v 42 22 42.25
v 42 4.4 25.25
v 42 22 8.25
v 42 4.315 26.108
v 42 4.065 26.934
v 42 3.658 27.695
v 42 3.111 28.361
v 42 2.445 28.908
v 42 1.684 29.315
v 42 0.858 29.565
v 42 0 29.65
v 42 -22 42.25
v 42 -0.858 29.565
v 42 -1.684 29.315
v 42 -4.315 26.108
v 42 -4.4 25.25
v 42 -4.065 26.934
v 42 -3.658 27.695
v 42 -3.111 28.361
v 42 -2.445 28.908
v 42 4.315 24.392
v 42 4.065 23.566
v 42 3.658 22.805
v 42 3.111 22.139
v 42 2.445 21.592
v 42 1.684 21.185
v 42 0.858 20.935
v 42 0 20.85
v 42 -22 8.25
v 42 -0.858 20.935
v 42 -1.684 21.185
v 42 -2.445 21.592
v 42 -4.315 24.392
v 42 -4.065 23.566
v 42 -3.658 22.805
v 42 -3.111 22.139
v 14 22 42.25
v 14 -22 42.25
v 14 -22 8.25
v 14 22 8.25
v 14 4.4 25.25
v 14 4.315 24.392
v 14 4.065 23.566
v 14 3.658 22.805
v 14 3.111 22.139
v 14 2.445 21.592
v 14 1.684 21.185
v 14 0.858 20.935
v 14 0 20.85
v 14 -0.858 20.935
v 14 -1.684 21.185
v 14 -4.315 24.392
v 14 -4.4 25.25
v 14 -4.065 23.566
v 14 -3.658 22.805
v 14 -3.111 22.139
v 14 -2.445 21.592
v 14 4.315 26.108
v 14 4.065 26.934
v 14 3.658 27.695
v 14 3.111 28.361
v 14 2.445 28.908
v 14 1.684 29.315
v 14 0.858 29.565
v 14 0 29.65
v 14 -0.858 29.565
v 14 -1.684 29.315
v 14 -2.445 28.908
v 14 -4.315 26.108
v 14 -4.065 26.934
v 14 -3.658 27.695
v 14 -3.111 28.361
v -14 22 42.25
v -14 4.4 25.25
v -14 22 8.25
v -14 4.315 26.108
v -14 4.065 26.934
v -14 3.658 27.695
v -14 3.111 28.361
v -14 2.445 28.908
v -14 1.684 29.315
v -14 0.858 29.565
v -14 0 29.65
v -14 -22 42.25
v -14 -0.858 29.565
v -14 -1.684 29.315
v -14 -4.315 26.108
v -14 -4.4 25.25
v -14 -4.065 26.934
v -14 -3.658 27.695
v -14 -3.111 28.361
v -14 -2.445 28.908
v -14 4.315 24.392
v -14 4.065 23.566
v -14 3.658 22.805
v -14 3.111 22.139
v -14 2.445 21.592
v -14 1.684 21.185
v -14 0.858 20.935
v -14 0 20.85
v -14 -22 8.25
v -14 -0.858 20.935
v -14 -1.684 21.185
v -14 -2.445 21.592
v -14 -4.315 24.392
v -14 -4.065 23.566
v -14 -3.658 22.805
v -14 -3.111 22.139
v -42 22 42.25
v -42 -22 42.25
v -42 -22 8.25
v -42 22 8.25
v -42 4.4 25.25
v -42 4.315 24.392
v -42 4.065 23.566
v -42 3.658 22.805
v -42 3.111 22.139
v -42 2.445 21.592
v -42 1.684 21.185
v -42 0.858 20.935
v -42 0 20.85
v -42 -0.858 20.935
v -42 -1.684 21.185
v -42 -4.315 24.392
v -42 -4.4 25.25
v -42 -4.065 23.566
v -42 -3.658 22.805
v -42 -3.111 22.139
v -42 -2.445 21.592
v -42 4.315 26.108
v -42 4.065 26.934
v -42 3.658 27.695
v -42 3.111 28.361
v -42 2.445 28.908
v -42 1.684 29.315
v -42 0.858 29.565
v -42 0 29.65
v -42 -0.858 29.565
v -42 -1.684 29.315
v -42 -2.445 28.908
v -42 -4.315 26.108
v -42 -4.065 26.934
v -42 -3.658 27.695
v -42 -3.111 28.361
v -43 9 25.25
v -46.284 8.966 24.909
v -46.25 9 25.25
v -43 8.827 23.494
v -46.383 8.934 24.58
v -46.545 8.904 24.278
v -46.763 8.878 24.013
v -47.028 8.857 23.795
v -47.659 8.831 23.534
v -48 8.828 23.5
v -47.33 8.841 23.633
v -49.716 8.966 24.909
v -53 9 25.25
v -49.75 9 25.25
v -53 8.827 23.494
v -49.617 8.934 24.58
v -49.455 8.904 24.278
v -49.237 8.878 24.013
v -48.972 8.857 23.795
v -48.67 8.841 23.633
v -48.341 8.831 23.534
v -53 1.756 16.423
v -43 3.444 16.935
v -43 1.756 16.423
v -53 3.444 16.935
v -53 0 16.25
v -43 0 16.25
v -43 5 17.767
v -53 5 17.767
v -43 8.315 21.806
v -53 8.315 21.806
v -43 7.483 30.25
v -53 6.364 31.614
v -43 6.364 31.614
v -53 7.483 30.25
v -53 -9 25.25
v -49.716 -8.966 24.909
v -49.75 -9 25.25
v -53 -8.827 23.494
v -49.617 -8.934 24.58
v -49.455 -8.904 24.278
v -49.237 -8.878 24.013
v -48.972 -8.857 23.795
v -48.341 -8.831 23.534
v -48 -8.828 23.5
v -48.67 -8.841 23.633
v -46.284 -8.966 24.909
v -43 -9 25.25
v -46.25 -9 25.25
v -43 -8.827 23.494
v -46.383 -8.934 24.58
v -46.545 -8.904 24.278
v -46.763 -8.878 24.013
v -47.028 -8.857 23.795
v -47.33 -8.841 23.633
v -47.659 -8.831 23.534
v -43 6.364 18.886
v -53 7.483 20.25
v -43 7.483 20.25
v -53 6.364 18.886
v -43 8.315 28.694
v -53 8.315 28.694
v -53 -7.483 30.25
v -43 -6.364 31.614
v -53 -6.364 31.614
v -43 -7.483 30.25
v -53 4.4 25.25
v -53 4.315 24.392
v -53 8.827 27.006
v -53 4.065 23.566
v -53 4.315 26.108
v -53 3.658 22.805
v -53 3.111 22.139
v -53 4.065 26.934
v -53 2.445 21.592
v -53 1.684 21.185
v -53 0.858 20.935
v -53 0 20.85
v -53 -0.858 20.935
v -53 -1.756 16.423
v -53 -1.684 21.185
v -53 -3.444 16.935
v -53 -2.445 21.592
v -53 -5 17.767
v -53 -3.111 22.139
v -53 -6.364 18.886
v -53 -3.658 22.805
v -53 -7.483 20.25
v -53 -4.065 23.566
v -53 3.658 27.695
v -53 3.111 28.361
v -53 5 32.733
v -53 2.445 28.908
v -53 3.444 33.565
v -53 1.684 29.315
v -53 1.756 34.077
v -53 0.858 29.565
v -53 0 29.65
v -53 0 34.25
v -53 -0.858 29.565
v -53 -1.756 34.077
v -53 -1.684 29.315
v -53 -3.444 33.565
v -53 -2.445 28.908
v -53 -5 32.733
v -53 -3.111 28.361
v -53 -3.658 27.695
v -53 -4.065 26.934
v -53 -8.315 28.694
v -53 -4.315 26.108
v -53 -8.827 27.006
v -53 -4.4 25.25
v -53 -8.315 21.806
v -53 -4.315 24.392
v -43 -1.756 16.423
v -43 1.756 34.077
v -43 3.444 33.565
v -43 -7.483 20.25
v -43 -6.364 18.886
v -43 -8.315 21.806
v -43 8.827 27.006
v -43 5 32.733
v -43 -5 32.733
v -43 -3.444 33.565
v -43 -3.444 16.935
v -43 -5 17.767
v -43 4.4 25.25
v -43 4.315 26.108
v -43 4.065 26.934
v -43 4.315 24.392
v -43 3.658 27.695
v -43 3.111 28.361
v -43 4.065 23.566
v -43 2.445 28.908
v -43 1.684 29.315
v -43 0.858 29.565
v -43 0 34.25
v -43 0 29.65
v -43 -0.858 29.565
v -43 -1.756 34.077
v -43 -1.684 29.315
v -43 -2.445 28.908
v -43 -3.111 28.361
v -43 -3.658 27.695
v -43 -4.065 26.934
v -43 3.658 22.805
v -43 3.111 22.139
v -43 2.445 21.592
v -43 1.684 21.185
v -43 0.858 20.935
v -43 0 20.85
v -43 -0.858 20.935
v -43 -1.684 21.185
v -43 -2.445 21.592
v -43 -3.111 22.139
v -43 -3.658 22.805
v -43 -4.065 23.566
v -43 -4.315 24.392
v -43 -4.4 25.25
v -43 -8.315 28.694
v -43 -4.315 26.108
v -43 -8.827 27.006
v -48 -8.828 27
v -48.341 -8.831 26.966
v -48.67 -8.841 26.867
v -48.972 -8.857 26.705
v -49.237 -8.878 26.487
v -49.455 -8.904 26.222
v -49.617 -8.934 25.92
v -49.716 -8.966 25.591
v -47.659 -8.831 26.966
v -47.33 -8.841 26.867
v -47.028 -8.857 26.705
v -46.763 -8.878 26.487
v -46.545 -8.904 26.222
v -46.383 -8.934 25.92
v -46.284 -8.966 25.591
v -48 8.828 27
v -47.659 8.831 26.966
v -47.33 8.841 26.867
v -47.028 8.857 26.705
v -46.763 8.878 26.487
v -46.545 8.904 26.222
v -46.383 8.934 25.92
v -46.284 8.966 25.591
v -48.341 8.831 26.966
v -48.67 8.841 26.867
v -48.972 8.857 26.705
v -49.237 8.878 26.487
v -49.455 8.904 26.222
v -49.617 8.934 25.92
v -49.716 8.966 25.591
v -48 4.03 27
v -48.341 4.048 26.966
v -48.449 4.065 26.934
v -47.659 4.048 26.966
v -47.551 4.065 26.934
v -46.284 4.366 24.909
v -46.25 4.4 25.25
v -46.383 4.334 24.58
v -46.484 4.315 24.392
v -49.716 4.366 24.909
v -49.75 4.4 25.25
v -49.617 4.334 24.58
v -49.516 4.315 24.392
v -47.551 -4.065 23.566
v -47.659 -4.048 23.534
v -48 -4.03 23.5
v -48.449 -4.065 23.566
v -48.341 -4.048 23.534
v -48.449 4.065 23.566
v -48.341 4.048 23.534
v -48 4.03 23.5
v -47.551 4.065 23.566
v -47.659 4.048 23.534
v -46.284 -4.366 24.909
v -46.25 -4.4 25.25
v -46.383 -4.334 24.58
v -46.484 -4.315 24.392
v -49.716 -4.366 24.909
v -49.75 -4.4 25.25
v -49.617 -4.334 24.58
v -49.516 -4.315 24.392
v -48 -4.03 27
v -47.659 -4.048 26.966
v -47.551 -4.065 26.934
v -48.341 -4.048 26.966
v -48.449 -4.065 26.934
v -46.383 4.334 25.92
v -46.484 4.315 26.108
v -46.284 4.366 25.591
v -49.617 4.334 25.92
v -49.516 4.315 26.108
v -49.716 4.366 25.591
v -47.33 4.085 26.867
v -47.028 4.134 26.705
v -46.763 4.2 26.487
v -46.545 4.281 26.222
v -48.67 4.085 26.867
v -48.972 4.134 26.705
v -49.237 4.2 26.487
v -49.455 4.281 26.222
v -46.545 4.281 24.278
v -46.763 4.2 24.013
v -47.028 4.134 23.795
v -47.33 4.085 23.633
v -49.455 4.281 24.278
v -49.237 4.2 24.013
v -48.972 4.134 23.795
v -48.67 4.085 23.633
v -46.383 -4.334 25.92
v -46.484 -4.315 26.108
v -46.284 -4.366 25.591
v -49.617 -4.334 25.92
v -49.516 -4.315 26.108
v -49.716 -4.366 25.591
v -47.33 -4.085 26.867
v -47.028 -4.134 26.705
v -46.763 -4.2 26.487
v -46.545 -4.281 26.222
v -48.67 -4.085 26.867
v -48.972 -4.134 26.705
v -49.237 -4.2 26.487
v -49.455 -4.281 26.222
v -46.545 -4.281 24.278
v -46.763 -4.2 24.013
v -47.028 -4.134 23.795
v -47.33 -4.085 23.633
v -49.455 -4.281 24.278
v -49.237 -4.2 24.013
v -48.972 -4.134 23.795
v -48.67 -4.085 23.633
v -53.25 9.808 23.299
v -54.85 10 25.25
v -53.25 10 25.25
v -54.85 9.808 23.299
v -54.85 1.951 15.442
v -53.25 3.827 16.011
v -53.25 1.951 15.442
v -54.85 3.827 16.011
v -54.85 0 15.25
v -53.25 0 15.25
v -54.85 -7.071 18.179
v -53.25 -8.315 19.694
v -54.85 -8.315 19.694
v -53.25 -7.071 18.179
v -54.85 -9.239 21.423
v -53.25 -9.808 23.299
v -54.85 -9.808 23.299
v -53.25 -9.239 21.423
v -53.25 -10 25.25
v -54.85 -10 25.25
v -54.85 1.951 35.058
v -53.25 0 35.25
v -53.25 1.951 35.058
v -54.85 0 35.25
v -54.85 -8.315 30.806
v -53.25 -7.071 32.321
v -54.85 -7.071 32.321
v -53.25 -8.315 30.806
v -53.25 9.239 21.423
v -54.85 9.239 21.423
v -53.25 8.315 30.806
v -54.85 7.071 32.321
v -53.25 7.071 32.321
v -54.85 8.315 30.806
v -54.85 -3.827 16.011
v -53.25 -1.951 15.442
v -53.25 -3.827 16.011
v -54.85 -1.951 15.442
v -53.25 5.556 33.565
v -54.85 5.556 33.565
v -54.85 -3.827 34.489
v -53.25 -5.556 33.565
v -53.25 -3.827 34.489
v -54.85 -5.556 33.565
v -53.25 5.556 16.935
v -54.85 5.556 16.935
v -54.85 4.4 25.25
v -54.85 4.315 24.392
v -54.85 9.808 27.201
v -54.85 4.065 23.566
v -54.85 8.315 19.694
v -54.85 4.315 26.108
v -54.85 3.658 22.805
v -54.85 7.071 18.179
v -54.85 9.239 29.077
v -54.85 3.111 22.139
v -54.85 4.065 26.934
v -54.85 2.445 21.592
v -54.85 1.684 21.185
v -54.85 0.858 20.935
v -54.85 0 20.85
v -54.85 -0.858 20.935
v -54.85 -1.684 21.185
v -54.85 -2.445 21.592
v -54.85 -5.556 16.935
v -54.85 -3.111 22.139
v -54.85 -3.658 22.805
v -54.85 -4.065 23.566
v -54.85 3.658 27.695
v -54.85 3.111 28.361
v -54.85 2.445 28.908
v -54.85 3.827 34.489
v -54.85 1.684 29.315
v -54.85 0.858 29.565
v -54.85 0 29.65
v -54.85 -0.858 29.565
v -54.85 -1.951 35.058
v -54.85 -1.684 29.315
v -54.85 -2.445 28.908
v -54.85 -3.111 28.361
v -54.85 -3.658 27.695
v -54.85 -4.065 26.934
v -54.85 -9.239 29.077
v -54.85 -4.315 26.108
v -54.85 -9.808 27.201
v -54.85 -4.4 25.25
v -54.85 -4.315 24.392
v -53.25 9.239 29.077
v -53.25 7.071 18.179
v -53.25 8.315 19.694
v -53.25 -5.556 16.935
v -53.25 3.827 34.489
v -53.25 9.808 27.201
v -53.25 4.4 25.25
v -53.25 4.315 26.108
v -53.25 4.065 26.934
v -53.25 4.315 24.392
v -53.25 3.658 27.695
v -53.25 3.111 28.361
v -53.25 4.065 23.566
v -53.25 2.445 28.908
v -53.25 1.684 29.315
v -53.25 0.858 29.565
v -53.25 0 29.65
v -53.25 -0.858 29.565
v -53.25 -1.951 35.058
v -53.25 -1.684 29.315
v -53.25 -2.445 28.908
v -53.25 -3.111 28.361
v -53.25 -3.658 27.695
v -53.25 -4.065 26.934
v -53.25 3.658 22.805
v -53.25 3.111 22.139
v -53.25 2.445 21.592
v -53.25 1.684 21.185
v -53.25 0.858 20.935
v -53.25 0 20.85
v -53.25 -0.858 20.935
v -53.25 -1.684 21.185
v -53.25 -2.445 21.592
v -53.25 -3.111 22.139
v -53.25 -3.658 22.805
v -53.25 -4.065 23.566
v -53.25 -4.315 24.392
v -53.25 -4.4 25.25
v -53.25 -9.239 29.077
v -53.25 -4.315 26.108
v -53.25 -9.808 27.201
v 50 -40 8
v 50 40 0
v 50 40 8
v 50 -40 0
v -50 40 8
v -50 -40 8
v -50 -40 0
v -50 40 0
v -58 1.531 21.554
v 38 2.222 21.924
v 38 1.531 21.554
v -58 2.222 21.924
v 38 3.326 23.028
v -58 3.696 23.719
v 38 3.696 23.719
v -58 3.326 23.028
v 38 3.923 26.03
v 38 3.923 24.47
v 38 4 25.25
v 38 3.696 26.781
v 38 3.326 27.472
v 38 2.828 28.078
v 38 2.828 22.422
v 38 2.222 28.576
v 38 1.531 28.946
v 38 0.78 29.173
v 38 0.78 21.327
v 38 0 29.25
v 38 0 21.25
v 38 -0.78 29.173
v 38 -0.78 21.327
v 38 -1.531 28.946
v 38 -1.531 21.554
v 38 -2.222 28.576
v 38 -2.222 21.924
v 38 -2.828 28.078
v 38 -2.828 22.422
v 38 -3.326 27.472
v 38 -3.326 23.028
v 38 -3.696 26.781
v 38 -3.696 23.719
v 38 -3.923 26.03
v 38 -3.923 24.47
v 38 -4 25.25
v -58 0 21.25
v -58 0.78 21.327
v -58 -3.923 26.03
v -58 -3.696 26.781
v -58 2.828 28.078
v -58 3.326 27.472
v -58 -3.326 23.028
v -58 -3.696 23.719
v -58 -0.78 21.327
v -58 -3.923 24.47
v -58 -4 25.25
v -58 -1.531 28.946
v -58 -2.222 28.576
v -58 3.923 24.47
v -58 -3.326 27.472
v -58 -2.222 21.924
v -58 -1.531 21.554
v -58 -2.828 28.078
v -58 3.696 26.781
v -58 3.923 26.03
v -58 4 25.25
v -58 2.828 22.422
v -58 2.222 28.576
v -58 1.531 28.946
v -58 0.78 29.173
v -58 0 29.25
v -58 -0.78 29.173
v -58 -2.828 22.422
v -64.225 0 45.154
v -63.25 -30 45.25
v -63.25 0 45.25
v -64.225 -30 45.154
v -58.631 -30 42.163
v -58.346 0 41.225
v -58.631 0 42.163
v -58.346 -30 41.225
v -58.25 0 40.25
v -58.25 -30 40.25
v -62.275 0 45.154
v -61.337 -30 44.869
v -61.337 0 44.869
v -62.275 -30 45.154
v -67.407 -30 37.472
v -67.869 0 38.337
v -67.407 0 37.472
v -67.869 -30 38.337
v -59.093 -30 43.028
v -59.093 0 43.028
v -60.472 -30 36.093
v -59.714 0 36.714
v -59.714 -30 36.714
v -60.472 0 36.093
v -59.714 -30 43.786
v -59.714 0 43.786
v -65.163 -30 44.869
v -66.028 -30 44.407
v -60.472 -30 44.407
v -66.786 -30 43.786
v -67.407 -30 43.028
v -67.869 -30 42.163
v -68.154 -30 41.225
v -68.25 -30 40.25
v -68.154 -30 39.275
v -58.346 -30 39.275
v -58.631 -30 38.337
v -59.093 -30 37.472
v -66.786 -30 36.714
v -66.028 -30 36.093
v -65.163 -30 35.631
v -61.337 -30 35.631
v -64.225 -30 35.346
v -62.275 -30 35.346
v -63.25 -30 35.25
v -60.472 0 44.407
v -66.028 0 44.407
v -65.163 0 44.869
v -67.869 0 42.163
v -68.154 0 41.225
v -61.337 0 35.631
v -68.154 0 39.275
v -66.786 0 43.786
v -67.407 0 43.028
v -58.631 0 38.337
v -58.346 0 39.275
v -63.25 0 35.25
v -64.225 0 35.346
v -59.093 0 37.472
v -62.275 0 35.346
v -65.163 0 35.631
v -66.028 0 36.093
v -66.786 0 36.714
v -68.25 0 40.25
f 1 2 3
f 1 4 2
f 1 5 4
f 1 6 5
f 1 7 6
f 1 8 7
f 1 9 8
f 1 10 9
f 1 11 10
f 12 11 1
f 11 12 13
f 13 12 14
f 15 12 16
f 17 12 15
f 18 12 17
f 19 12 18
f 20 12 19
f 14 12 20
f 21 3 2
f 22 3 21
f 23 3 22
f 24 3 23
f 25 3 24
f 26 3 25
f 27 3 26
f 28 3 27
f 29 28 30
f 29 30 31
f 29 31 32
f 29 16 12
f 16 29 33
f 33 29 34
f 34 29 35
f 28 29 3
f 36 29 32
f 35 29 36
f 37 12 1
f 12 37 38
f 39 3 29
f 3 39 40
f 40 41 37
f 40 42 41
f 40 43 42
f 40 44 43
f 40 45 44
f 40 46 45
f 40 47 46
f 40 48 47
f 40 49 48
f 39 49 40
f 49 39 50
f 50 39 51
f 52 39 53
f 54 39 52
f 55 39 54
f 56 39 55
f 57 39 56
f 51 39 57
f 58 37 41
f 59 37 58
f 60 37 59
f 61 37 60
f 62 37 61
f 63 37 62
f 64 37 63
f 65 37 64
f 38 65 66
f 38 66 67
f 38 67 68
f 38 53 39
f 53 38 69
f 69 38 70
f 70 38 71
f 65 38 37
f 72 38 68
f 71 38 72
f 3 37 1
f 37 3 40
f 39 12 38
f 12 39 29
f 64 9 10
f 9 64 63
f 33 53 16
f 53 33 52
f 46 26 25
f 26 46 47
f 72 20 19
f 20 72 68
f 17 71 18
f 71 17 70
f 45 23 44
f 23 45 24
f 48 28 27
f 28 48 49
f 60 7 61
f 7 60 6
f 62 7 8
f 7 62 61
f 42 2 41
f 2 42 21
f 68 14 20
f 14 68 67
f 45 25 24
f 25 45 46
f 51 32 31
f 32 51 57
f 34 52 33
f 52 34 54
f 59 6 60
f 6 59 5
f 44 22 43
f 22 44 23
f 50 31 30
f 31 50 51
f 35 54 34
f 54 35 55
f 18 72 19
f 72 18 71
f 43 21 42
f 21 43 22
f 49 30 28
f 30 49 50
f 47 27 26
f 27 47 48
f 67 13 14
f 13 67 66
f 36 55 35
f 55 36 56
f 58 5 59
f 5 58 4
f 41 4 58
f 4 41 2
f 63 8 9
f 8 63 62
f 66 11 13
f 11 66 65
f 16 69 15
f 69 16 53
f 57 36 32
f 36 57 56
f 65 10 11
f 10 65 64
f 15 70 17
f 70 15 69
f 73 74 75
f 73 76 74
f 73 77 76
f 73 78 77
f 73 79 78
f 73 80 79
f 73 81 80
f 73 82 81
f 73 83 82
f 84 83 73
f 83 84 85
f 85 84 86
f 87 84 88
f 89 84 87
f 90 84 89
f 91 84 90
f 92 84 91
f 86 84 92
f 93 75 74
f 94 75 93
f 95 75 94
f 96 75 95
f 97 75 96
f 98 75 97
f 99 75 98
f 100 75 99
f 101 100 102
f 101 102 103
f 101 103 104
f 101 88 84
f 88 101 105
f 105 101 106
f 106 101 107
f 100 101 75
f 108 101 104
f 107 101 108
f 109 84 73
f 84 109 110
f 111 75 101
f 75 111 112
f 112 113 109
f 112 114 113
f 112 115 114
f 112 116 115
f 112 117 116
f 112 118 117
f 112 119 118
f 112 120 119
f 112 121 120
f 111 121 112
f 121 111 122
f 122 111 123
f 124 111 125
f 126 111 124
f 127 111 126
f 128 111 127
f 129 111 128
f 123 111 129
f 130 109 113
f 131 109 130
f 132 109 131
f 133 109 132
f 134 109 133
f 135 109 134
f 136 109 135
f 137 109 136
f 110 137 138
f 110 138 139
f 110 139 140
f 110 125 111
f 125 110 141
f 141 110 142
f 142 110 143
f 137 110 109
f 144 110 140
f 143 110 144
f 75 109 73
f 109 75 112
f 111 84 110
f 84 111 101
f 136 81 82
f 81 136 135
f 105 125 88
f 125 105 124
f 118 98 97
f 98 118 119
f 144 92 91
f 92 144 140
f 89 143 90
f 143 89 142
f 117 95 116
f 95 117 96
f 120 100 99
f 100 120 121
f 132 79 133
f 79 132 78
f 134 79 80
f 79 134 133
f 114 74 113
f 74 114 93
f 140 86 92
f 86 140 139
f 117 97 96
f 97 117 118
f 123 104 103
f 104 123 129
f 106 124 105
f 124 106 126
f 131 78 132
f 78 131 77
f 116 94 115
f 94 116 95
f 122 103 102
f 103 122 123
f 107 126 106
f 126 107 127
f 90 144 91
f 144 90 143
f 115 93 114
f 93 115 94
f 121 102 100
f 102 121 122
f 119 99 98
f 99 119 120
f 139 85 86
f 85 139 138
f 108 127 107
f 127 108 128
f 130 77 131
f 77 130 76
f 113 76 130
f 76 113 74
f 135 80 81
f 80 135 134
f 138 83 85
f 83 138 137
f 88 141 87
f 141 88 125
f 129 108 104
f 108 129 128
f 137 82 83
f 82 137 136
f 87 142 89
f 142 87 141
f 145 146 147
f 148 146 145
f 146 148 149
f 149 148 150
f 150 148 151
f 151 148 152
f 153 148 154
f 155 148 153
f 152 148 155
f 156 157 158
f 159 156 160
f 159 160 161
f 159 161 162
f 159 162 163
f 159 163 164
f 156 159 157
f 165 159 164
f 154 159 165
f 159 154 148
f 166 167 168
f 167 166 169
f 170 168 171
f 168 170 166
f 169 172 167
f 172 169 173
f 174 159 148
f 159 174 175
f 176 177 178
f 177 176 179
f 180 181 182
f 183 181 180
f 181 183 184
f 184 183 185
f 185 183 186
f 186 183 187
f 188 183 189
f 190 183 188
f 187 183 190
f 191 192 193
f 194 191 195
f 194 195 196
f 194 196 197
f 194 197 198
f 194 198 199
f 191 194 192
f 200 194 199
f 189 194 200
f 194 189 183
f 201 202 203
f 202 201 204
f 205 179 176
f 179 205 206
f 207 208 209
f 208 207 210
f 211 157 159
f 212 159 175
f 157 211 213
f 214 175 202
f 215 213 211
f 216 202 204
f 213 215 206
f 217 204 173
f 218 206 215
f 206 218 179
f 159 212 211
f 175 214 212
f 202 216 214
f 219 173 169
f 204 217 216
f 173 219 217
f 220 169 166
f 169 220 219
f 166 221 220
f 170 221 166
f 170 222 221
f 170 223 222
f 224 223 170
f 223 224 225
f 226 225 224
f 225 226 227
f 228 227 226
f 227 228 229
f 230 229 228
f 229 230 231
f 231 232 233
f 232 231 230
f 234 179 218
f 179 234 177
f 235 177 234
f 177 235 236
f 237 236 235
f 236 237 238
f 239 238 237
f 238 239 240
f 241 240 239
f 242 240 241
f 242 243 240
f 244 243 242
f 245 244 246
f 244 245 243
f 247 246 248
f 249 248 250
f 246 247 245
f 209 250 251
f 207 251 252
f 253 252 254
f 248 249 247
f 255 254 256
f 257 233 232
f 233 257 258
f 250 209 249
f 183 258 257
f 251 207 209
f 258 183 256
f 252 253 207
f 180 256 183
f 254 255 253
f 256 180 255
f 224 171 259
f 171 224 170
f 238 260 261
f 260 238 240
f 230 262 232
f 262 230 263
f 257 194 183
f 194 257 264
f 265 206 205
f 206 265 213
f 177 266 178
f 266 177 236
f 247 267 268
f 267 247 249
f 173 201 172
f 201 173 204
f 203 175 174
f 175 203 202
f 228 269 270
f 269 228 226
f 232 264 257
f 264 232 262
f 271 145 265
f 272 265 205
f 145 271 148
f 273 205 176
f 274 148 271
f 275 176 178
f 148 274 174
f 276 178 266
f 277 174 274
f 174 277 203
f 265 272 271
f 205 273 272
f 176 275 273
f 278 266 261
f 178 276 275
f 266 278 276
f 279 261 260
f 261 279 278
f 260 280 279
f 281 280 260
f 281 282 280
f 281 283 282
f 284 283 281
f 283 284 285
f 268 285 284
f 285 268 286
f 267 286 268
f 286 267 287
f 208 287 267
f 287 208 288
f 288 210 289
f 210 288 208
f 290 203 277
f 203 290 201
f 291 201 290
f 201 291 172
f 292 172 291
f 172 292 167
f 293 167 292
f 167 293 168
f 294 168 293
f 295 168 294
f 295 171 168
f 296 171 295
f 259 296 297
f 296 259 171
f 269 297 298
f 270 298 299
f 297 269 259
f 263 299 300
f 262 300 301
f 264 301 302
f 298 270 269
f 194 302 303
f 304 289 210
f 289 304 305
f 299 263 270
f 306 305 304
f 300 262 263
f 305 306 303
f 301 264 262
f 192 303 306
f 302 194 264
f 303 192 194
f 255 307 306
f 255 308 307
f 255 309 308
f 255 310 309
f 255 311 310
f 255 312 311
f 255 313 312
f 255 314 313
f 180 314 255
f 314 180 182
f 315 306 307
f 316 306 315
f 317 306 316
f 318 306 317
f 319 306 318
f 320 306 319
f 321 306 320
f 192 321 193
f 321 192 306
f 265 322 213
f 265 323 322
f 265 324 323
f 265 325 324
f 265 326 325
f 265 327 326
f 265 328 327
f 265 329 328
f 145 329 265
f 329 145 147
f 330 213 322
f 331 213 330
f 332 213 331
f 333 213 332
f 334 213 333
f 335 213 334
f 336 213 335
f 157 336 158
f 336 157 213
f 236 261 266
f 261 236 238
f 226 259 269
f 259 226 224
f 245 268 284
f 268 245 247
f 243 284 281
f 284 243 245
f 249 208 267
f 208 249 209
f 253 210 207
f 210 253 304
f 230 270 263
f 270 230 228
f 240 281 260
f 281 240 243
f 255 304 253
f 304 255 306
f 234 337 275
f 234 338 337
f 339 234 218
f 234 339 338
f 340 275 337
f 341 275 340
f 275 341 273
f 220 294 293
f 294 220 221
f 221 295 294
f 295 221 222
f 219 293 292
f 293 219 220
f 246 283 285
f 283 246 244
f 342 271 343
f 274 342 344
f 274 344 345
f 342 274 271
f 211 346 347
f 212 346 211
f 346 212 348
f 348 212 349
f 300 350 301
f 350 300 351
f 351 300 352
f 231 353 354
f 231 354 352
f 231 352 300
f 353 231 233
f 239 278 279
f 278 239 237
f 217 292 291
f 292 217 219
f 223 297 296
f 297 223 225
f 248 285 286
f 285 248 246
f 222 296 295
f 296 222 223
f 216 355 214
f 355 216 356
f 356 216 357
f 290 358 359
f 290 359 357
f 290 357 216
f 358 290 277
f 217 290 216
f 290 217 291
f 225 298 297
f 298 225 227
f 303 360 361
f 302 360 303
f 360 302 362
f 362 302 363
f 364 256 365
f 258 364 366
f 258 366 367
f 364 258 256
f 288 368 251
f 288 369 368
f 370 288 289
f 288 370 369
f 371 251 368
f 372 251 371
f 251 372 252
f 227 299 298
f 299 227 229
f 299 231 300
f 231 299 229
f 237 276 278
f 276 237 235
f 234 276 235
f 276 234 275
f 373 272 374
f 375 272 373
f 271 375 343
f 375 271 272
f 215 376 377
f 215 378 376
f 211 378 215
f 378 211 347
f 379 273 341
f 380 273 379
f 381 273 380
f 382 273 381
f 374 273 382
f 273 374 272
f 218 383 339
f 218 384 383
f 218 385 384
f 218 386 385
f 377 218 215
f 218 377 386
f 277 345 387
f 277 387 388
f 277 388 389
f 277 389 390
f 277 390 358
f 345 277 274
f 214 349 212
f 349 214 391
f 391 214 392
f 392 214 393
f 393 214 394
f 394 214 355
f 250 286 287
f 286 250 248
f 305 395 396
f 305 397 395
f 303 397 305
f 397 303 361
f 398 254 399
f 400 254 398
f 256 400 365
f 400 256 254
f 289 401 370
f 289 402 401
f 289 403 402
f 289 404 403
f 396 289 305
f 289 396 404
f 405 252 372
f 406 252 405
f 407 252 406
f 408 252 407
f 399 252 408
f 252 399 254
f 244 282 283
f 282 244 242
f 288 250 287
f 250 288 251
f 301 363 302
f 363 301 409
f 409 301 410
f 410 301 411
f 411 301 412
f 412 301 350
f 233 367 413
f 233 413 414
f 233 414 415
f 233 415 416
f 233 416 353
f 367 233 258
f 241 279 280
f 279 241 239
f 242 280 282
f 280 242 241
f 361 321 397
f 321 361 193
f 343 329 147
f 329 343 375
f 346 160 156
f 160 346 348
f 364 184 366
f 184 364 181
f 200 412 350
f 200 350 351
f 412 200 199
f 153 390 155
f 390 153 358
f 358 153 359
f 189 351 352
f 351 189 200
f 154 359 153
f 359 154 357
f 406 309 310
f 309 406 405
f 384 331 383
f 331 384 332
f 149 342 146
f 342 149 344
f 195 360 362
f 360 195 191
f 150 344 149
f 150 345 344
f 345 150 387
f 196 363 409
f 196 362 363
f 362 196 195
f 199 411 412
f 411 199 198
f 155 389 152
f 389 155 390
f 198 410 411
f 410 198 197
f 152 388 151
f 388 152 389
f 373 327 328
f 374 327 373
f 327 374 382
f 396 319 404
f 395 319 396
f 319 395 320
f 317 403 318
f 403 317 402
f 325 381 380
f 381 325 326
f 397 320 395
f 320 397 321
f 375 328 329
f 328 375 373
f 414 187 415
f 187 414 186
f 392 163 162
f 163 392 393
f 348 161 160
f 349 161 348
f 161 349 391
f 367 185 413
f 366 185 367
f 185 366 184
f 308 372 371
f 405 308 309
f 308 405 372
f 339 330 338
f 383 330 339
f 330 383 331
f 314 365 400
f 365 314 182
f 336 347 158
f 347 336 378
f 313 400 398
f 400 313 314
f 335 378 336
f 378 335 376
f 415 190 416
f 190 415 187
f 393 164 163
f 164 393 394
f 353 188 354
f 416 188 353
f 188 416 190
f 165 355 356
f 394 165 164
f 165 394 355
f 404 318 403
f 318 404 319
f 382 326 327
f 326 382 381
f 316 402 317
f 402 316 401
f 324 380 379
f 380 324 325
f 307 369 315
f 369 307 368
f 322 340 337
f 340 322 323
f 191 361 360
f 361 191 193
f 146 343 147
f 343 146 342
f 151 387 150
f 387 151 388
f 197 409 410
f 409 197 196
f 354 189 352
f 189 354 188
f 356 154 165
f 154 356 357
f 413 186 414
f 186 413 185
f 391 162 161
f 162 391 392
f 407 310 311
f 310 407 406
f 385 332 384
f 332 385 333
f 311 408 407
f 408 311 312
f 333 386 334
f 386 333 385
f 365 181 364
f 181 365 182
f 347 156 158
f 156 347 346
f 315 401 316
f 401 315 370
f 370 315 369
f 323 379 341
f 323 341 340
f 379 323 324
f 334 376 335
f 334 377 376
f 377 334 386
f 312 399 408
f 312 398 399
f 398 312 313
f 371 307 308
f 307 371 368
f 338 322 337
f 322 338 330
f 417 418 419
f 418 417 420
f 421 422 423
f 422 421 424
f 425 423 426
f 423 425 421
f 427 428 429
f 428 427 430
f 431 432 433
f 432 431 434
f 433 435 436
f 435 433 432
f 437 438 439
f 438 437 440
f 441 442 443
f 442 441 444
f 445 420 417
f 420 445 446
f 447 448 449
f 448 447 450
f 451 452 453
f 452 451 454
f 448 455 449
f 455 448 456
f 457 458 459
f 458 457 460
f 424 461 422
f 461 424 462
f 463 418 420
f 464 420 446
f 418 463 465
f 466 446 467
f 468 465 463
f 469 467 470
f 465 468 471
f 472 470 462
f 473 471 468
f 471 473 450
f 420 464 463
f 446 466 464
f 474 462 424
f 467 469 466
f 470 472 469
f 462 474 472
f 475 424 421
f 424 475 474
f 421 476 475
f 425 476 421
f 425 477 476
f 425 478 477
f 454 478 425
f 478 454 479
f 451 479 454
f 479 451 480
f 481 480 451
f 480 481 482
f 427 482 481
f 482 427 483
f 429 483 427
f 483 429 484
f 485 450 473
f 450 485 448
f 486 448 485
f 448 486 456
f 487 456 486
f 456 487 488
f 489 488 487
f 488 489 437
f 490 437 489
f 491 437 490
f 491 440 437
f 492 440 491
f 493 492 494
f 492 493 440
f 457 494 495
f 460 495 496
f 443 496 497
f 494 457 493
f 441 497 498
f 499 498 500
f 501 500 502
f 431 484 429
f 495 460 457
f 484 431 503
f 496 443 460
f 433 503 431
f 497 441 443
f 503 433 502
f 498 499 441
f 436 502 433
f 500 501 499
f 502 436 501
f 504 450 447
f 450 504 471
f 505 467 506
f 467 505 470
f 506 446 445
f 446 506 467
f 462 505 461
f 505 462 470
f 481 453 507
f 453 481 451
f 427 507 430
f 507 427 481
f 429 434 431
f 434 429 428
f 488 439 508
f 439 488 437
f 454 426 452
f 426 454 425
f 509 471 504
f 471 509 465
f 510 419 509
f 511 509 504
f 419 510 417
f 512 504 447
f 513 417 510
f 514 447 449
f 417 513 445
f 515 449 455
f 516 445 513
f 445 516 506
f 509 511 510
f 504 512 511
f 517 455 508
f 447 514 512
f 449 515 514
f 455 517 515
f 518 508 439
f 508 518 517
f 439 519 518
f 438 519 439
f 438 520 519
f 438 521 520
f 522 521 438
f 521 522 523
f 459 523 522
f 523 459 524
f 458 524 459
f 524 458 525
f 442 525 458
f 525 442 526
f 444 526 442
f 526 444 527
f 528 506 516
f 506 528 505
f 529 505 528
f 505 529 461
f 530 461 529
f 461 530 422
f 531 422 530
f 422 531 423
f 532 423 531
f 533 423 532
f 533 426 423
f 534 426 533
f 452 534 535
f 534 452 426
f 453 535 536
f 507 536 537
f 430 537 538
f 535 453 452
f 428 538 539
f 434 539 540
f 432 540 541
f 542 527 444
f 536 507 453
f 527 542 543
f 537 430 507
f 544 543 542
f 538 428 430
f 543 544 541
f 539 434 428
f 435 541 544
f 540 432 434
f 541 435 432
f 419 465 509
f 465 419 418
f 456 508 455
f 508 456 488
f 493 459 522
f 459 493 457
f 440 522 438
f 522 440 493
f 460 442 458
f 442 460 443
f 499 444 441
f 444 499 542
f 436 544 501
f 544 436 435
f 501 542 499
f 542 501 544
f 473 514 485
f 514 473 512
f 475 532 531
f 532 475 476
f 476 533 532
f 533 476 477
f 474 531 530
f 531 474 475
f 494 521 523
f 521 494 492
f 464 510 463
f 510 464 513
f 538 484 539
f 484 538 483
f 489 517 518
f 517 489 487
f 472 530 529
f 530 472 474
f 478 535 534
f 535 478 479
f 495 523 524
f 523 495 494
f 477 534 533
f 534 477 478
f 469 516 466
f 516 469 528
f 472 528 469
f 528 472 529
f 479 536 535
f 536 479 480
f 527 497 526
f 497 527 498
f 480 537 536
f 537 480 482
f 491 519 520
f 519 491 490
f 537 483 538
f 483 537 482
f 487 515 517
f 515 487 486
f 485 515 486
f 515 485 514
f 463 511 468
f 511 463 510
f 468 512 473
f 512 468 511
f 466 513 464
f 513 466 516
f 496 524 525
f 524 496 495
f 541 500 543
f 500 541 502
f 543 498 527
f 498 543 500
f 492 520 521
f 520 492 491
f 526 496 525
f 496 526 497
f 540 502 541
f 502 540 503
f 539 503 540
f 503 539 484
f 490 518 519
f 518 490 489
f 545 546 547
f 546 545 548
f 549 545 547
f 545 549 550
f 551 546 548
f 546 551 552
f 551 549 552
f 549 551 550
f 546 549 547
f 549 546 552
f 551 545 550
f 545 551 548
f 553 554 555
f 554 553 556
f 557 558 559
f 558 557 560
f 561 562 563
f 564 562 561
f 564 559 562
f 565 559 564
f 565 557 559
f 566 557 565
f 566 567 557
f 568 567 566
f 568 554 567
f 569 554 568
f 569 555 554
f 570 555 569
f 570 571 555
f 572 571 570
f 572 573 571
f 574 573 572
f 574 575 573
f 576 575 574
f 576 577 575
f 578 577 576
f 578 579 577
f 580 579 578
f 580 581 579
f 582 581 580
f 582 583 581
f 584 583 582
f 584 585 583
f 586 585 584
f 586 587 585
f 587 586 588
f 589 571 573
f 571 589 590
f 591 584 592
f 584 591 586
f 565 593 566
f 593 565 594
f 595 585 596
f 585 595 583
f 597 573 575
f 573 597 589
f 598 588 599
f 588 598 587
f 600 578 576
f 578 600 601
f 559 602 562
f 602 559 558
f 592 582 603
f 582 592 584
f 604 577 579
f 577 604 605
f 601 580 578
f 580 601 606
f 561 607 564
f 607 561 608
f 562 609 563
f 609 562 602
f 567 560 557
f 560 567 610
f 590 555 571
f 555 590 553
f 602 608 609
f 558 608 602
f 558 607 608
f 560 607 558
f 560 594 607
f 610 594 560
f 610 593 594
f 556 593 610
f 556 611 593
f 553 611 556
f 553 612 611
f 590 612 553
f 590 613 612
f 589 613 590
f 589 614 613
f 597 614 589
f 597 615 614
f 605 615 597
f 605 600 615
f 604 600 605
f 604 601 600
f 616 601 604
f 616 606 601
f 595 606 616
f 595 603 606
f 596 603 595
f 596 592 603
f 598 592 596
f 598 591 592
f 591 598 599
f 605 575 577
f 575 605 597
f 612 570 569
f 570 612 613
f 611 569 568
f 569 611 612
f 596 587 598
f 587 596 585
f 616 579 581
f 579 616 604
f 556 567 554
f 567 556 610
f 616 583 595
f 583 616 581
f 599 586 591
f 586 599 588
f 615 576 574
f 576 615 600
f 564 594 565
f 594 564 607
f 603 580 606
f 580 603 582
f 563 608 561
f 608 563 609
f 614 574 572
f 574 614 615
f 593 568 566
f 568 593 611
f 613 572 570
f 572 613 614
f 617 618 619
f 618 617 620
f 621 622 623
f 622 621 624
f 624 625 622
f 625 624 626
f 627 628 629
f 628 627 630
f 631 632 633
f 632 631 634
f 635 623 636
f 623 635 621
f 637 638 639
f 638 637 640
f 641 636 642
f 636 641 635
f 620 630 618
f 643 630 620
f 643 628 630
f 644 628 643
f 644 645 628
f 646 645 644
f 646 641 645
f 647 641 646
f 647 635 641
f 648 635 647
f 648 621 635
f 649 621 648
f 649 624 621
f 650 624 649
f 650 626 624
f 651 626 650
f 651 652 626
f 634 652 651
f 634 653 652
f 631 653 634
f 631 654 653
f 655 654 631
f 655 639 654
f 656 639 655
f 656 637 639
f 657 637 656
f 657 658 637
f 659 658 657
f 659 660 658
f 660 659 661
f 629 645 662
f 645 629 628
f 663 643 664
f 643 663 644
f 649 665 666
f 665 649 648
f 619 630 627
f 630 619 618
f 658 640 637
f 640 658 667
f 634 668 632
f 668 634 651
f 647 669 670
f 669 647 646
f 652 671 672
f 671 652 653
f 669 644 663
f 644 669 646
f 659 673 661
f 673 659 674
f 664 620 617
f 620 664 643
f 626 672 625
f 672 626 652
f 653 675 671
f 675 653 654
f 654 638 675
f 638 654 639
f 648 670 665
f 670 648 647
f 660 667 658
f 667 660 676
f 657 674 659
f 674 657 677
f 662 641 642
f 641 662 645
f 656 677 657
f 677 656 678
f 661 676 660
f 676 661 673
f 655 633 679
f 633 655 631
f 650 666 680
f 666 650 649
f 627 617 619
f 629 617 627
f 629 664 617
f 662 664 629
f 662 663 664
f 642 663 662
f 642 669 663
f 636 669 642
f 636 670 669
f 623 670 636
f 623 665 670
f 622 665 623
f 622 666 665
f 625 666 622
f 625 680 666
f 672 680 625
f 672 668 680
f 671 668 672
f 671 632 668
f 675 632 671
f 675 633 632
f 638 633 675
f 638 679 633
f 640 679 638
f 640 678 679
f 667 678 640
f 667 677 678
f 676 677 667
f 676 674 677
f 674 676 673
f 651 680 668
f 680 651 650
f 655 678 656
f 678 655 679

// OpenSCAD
$fn = 32;

// ------------------------------------------------------------------------
// Machine vise: screw d8, jaws 28 x 34 mm
// Every part is its own module, assembly() places every instance.
// ------------------------------------------------------------------------

// --- part 1 ---
module vise_bed() {
  difference() {
    translate([-50, -40, 0]) cube([100, 80, 8]);
  }
}

// --- part 2 ---
module vise_jaw() {
  difference() {
    translate([-14, -22, 0]) cube([28, 44, 34]);
    translate([0, 0, 17]) rotate([0, 90, 0]) cylinder(h = 30, d = 8.8, center = true);
  }
}

// --- part 3 ---
module vise_screw() {
  translate([0, 0, -48]) cylinder(h = 96, d = 8);
}

// --- part 4 ---
module screw_collar() {
  difference() {
    cylinder(h = 10, d = 18);
    translate([0, 0, -1]) cylinder(h = 12, d = 8.8);
    translate([0, 0, 5]) rotate([90, 0, 0]) cylinder(h = 20, d = 3.5, center = true);
  }
}

// --- part 5 ---
module screw_washer() {
  difference() {
      translate([0, 0, 0]) cylinder(h = 1.6, d = 20);
      translate([0, 0, -1]) cylinder(h = 3.6, d = 8.8);
    }
}

// --- part 6 ---
module vise_handle() {
  cylinder(h = 30, d = 10);
}

// --- assembly ---
module assembly() {
  color([0.80, 0.24, 0.20]) translate([0, 0, 0]) rotate([0, 0, 0]) vise_bed();
  color([0.20, 0.45, 0.75]) translate([28, 0, 8.25]) rotate([0, 0, 0]) vise_jaw();
  color([0.25, 0.62, 0.32]) translate([-28, 0, 8.25]) rotate([0, 0, 0]) vise_jaw();
  color([0.92, 0.70, 0.18]) translate([-10, 0, 25.25]) rotate([0, 90, 0]) vise_screw();
  color([0.58, 0.35, 0.70]) translate([-53, 0, 25.25]) rotate([0, 90, 0]) screw_collar();
  color([0.16, 0.66, 0.66]) translate([-54.85, 0, 25.25]) rotate([0, 90, 0]) screw_washer();
  color([0.85, 0.48, 0.18]) translate([-63.25, 0, 40.25]) rotate([90, 0, 0]) vise_handle();
}

assembly();
